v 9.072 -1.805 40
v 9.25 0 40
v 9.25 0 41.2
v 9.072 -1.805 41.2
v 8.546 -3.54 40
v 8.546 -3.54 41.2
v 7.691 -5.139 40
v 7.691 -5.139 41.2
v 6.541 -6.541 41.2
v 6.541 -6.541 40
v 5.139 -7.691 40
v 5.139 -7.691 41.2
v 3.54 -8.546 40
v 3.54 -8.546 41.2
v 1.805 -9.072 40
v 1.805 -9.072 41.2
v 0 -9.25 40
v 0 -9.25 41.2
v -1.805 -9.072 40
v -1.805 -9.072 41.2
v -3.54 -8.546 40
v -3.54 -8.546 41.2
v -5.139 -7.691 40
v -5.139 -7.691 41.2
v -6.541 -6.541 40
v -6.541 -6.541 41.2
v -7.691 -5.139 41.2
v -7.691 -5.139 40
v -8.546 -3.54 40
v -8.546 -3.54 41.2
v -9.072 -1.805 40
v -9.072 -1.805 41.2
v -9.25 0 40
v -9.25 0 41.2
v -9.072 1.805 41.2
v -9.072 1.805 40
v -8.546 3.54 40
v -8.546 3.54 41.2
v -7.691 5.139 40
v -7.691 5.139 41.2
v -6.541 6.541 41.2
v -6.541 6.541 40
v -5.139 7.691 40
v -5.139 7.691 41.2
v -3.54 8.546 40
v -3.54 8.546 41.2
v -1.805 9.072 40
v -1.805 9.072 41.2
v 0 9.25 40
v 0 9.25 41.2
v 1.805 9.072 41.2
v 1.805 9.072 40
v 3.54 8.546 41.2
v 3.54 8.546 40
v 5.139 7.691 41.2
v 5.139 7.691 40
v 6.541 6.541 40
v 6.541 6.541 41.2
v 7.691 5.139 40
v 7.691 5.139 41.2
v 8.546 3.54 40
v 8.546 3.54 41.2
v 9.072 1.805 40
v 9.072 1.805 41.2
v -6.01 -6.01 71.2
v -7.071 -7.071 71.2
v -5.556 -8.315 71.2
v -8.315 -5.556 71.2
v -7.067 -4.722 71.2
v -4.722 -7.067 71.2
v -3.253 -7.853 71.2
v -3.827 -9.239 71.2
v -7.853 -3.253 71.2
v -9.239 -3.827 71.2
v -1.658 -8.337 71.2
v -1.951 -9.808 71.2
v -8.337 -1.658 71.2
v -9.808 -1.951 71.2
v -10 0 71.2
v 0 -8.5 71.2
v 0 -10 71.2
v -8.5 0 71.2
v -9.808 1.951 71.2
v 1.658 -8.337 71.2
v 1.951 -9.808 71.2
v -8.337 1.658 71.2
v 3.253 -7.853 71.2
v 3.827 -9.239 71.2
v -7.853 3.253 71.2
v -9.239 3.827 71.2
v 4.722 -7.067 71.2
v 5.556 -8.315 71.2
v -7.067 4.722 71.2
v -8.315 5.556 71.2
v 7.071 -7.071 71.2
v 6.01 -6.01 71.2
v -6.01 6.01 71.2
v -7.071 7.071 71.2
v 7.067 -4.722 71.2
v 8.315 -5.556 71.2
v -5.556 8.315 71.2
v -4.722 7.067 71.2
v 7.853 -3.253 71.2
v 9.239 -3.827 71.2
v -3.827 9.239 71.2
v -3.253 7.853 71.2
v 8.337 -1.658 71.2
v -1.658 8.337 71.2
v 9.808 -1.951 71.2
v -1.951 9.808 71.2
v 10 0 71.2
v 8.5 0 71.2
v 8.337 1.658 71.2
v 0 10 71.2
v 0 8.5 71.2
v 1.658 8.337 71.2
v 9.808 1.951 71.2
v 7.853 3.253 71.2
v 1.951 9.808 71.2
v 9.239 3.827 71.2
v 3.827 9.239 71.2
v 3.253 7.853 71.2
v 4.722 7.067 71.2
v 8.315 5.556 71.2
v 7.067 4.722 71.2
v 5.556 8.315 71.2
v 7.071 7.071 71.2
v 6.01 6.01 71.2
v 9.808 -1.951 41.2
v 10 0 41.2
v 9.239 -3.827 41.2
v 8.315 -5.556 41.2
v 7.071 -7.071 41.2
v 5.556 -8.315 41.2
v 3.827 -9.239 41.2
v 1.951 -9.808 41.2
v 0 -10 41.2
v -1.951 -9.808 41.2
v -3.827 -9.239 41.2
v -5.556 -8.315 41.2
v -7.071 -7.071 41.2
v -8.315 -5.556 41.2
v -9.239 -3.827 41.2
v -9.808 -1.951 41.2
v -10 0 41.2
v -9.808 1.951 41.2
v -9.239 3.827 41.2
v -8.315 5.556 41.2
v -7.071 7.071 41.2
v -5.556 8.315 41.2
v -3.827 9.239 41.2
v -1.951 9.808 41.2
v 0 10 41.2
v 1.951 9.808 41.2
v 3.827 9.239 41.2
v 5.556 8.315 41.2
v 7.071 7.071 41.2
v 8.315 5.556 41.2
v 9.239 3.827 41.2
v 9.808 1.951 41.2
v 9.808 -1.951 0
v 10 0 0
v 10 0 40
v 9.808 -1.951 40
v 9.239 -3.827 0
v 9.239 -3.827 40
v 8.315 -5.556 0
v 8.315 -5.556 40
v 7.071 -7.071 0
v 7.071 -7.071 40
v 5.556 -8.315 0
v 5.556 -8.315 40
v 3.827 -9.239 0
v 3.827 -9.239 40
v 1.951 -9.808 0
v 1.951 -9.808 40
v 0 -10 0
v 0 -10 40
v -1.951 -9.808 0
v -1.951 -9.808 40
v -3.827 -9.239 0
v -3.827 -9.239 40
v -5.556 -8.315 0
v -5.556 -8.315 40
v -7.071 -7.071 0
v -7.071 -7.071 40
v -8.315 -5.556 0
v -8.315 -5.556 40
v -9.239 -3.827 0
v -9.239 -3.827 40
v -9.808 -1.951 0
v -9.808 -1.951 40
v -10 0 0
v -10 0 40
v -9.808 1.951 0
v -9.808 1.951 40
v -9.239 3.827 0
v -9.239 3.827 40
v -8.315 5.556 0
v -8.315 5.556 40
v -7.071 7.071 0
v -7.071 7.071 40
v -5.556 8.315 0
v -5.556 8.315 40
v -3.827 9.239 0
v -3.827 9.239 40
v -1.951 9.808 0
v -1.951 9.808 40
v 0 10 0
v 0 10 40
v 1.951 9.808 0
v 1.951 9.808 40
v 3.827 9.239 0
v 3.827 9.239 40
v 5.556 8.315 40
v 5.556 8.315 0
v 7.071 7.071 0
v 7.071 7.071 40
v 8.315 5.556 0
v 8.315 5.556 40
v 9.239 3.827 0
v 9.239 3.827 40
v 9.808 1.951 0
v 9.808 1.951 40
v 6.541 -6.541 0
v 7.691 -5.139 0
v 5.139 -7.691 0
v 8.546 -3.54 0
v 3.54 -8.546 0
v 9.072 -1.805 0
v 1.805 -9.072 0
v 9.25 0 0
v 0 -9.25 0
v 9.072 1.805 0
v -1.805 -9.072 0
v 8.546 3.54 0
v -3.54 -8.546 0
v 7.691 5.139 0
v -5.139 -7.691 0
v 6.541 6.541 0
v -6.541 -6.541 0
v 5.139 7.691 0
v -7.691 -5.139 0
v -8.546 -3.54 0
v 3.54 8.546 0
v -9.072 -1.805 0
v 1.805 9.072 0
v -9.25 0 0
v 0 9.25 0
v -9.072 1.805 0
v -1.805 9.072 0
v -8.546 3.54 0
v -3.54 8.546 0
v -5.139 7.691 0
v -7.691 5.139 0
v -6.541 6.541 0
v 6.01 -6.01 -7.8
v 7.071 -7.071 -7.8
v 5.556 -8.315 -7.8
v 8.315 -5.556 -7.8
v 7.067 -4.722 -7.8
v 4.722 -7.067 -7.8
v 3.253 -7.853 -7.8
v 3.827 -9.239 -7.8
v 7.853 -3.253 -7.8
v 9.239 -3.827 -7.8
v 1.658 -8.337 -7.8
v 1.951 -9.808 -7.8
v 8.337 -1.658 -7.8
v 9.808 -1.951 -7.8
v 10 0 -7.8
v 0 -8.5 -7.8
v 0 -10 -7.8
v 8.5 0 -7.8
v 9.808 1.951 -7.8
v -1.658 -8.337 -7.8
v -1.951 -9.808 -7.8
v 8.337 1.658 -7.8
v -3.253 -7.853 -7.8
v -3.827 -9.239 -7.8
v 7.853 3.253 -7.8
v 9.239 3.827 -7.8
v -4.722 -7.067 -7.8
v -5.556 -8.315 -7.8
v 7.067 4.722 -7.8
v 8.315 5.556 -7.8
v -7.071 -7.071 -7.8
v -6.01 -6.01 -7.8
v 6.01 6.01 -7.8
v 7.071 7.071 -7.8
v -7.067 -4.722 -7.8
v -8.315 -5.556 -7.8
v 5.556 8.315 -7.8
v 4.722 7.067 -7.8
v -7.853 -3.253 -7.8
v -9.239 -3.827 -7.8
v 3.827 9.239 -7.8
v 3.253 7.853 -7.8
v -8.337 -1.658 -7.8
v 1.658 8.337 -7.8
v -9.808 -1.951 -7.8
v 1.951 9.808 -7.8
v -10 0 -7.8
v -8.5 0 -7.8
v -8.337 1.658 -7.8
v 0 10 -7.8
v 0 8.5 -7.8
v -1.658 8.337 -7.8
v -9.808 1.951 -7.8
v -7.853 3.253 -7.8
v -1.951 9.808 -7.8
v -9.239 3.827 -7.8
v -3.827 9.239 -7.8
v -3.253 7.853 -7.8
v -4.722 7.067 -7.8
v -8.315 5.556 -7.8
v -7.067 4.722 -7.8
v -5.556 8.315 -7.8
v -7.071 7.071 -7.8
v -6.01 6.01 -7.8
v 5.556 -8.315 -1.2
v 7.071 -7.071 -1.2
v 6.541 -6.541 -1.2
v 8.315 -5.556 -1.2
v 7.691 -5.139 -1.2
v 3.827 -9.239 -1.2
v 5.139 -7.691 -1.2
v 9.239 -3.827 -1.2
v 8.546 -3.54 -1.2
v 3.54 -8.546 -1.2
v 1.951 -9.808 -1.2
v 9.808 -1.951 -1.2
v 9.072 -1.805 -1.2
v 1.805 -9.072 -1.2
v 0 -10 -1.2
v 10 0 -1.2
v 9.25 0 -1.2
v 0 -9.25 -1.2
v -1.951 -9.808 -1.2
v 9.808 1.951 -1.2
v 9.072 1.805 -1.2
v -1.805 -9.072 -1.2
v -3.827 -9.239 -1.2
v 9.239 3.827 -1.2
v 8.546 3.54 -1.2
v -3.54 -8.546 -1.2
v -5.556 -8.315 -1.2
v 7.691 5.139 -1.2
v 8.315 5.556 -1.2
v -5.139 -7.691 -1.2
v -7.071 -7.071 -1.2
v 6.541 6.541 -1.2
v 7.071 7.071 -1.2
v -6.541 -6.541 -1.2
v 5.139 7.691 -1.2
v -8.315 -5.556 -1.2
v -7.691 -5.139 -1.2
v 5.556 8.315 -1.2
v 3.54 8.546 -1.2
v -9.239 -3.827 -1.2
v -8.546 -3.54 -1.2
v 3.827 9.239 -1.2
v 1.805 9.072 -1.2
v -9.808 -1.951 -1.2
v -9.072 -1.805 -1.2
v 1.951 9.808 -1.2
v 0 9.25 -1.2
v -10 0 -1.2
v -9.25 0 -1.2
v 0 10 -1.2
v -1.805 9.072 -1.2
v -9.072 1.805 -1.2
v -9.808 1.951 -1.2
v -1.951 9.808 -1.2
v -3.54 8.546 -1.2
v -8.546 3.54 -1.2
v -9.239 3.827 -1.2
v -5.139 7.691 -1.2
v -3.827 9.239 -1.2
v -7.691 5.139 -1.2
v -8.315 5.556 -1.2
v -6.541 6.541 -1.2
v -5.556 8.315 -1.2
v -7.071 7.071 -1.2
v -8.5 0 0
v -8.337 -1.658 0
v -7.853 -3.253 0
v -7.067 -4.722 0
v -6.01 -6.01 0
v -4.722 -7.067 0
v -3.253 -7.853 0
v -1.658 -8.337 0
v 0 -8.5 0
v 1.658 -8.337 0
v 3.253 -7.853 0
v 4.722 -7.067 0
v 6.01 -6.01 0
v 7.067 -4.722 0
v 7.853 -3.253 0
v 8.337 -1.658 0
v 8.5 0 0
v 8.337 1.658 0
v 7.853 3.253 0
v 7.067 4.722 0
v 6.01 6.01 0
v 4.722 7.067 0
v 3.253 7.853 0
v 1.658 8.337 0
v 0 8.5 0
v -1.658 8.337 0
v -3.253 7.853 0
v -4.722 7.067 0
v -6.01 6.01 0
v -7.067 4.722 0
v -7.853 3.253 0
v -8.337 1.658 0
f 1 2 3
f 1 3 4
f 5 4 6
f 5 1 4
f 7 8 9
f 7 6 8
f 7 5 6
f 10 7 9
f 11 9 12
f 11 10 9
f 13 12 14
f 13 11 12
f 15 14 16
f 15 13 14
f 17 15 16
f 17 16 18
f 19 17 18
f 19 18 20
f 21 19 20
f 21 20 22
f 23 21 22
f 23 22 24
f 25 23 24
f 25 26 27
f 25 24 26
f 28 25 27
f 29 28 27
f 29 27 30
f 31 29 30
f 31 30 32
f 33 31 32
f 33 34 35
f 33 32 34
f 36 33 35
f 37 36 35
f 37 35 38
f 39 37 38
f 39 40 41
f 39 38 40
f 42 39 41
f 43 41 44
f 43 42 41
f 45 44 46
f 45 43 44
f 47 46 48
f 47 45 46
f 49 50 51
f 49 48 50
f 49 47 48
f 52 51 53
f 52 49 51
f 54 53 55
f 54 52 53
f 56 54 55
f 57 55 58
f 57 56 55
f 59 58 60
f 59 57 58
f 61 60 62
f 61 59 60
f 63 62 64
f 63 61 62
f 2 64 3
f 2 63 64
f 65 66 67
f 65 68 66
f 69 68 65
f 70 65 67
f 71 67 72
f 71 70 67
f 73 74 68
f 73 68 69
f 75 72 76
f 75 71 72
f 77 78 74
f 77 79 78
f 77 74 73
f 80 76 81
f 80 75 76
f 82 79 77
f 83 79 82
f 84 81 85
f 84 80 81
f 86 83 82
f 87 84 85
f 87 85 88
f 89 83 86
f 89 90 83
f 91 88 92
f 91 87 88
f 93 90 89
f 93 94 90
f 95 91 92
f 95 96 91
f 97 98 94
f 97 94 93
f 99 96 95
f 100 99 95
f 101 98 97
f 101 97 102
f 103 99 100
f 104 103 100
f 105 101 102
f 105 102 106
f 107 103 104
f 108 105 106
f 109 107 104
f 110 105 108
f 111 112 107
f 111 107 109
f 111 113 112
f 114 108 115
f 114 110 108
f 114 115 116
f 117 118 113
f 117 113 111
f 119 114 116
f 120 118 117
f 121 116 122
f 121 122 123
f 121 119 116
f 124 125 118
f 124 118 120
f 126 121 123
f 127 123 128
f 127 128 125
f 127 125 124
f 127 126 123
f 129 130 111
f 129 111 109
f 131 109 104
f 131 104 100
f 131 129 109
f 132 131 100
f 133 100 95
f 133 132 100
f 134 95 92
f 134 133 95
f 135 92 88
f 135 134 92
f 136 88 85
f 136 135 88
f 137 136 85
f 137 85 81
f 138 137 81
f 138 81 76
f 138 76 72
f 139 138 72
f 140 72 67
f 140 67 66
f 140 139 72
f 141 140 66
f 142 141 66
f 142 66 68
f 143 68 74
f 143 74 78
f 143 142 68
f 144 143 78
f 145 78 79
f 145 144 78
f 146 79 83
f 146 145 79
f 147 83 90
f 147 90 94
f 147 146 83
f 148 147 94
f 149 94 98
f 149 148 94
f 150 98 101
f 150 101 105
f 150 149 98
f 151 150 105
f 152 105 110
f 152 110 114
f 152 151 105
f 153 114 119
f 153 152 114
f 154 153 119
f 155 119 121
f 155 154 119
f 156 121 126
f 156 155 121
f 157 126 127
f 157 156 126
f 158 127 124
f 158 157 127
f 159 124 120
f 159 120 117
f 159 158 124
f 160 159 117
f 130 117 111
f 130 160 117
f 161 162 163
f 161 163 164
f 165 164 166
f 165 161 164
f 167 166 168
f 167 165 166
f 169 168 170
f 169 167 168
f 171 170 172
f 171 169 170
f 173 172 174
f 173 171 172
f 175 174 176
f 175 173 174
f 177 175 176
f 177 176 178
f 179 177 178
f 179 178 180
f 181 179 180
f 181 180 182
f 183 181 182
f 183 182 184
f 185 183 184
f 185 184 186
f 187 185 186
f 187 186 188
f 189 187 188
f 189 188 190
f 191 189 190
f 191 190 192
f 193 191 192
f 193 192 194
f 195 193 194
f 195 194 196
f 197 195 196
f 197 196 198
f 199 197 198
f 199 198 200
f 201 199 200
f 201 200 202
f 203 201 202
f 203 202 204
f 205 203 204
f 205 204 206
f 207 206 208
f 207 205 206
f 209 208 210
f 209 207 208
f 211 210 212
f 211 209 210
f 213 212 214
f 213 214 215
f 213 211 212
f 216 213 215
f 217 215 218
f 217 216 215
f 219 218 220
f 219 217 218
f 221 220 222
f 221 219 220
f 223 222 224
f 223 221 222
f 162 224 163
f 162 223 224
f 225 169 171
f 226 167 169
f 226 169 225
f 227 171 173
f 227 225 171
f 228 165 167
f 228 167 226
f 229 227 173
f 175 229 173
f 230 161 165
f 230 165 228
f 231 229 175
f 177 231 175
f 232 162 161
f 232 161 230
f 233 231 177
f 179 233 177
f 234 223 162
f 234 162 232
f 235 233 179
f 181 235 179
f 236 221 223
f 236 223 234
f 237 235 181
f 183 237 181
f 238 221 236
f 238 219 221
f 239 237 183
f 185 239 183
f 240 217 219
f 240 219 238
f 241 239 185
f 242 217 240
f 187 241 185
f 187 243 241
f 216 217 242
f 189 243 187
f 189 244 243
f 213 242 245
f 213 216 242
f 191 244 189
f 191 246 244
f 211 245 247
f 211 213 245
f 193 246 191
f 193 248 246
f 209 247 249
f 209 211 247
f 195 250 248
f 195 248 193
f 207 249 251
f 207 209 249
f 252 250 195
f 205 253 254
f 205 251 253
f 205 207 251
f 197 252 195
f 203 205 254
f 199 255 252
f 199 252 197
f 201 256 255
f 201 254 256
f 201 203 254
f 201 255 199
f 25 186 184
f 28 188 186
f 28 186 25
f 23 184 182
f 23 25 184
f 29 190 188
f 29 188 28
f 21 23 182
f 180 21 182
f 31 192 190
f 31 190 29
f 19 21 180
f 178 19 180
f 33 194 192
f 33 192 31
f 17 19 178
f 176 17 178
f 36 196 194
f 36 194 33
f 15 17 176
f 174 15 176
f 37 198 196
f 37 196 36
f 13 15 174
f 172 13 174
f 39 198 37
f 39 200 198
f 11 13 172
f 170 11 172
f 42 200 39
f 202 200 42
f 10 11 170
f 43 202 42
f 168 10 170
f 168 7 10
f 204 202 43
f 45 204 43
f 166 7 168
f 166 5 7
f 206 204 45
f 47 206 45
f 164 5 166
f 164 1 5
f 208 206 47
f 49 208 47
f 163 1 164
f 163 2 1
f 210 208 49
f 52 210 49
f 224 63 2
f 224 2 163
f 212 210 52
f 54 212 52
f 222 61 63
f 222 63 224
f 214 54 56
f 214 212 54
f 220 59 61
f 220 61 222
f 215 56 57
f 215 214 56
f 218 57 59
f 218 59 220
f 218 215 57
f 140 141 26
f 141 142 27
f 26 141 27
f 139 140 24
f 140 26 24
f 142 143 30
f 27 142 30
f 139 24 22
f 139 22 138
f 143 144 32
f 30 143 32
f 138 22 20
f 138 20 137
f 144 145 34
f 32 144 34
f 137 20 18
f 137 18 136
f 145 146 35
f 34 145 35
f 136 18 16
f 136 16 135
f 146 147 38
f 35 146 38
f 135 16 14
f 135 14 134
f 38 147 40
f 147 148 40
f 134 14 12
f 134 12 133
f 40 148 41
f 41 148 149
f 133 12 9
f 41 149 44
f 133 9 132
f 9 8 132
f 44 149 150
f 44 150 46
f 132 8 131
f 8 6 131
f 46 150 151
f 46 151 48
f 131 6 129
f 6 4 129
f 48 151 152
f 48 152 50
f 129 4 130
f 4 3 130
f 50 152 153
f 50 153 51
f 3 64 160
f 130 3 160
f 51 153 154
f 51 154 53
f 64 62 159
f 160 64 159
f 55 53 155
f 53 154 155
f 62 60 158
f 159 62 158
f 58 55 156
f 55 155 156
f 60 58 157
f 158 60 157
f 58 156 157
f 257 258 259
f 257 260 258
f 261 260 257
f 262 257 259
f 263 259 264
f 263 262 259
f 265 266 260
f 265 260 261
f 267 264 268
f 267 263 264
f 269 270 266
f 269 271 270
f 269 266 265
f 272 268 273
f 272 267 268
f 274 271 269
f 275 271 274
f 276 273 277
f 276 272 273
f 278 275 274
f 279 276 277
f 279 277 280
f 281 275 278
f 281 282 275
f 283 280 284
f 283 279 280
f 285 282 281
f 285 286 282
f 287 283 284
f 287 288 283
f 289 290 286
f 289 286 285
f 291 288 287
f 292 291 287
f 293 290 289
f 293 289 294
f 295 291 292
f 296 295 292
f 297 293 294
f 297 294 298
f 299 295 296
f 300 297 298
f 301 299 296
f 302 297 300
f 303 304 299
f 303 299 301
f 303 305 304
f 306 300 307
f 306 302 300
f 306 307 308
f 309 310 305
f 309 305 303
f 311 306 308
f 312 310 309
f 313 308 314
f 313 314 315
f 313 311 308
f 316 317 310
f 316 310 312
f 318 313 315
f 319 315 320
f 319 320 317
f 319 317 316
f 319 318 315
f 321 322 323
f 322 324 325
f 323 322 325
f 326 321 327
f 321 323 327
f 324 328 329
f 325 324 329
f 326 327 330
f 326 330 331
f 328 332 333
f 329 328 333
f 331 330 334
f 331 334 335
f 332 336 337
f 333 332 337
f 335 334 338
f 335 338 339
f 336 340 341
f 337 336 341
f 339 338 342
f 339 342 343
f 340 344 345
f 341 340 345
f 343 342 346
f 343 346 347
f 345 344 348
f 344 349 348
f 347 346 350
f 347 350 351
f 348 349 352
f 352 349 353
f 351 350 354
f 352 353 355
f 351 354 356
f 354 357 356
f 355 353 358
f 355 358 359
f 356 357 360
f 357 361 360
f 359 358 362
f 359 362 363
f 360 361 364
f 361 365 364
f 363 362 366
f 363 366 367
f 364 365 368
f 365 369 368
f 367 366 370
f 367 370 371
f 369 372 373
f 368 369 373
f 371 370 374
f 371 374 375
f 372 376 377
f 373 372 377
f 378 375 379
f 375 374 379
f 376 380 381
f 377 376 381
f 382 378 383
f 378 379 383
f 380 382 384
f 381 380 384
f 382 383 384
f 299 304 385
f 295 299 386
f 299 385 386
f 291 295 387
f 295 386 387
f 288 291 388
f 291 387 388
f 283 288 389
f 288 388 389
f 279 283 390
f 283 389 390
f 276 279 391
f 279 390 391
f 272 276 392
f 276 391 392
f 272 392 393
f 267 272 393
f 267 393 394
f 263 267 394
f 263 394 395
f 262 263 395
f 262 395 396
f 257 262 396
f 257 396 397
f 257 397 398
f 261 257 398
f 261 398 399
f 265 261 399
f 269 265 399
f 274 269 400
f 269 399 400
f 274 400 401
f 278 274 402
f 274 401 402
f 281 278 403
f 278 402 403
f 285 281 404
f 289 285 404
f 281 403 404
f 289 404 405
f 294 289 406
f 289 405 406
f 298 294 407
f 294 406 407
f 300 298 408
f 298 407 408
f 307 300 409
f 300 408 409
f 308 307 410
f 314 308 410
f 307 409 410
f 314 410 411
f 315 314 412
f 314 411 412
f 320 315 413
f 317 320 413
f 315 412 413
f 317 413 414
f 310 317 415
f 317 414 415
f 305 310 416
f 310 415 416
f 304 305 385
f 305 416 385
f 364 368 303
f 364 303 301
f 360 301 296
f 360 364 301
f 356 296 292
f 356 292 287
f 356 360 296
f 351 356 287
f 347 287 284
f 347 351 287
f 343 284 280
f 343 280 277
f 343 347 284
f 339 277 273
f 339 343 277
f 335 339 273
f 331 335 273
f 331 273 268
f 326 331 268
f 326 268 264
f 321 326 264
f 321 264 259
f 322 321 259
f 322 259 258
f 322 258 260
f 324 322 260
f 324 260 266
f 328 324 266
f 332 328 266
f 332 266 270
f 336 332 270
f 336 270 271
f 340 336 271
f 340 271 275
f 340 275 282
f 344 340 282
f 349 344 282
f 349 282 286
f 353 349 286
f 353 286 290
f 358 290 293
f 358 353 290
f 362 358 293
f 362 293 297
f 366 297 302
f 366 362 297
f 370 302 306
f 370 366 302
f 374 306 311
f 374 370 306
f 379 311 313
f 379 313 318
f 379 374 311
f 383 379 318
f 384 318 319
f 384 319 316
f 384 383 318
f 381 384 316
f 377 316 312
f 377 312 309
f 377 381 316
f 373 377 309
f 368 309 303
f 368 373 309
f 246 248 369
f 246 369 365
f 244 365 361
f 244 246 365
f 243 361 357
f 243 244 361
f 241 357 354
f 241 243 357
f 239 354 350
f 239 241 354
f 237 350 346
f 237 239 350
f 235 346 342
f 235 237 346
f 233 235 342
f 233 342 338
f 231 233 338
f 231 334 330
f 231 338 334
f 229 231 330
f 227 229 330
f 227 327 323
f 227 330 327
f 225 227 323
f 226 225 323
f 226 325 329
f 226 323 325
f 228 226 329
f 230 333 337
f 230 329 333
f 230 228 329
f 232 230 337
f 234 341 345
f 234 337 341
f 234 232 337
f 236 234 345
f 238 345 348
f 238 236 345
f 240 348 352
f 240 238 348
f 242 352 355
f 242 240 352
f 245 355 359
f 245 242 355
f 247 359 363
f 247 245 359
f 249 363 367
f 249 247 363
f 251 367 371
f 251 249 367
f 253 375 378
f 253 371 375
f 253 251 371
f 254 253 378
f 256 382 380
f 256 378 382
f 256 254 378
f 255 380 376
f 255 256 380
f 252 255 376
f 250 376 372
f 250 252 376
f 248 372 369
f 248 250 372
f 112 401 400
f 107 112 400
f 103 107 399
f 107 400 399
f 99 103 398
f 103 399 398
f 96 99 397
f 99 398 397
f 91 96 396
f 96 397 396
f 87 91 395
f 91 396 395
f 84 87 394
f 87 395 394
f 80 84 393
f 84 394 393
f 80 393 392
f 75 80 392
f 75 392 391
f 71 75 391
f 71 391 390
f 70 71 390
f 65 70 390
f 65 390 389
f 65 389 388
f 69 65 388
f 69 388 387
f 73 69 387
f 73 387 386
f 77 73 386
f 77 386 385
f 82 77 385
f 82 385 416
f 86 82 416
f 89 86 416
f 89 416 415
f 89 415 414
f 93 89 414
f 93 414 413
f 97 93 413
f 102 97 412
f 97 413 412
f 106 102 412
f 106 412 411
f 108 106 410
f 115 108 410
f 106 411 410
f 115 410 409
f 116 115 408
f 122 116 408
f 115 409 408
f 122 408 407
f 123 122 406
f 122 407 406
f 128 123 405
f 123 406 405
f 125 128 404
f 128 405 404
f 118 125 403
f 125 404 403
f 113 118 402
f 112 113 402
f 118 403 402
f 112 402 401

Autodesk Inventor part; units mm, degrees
ref_plane "YZ Plane" through (0, 0, 0) normal (1, 0, 0) x (0, 1, 0)
sketch "Эскиз1" plane through (0, 0, 0) normal (0, 0, 1) x (1, 0, 0)
  circle A0 centre (0, 0) radius 10
  circle A1 centre (0, 0) radius 8.5
  dimension "d1" = 20
  dimension "d2" = 17
extrude "Выдавливание1" add sketch "Эскиз1" along normal blind 74
ref_plane "РабПлоскость1" through (0, 0, 33) normal (0, 0, -1) x (-1, 0, 0)
ref_plane "РабПлоскость2" through (0, 0, 40) normal (0, 0, 1) x (1, 0, 0)
sketch "Эскиз3" plane through (0, 0, 40) normal (0, 0, 1) x (1, 0, 0)
  circle A0 centre (0, 0) radius 8.5 projected
  circle A1 centre (0, 0) radius 9.25
  circle A2 centre (0, 0) radius 11
  dimension "d9" = 18.5
  dimension "d10" = 22
extrude "Выдавливание3" cut sketch "Эскиз3" along normal blind 1.2 contours A2
ref_plane "РабПлоскость4" through (0, 0, 0) normal (0, 0, -1) x (-1, 0, 0)
ref_plane "РабПлоскость3" through (0, 0, 7) normal (0, 0, -1) x (-1, 0, 0)
sketch "Эскиз6" plane through (0, 0, 0) normal (0, 0, -1) x (-1, 0, 0)
  circle A0 centre (0, 0) radius 8.5 projected
  circle A1 centre (0, 0) radius 10 projected
extrude "Выдавливание6" add sketch "Эскиз6" along normal blind 15
sketch "Эскиз7" plane through (0, 0, 0) normal (0, 0, -1) x (-1, 0, 0)
  circle A0 centre (0, 0) radius 9.25
  circle A1 centre (0, 0) radius 11
  dimension "d25" = 18.5
  dimension "d26" = 22
extrude "Выдавливание7" cut sketch "Эскиз7" along normal blind 1.2
sketch "Эскиз8" plane through (0, 0, 74) normal (0, 0, 1) x (1, 0, 0)
  circle A0 centre (0, 0) radius 19.934
extrude "Выдавливание8" cut sketch "Эскиз8" against normal blind 2.8
sketch "Эскиз9" plane through (0, 0, -15) normal (0, 0, -1) x (-1, 0, 0)
  circle A0 centre (0, 0) radius 19.6449
  dimension "d33" = 39.2898
extrude "Выдавливание9" cut sketch "Эскиз9" against normal blind 7.2
properties part number "труба"
